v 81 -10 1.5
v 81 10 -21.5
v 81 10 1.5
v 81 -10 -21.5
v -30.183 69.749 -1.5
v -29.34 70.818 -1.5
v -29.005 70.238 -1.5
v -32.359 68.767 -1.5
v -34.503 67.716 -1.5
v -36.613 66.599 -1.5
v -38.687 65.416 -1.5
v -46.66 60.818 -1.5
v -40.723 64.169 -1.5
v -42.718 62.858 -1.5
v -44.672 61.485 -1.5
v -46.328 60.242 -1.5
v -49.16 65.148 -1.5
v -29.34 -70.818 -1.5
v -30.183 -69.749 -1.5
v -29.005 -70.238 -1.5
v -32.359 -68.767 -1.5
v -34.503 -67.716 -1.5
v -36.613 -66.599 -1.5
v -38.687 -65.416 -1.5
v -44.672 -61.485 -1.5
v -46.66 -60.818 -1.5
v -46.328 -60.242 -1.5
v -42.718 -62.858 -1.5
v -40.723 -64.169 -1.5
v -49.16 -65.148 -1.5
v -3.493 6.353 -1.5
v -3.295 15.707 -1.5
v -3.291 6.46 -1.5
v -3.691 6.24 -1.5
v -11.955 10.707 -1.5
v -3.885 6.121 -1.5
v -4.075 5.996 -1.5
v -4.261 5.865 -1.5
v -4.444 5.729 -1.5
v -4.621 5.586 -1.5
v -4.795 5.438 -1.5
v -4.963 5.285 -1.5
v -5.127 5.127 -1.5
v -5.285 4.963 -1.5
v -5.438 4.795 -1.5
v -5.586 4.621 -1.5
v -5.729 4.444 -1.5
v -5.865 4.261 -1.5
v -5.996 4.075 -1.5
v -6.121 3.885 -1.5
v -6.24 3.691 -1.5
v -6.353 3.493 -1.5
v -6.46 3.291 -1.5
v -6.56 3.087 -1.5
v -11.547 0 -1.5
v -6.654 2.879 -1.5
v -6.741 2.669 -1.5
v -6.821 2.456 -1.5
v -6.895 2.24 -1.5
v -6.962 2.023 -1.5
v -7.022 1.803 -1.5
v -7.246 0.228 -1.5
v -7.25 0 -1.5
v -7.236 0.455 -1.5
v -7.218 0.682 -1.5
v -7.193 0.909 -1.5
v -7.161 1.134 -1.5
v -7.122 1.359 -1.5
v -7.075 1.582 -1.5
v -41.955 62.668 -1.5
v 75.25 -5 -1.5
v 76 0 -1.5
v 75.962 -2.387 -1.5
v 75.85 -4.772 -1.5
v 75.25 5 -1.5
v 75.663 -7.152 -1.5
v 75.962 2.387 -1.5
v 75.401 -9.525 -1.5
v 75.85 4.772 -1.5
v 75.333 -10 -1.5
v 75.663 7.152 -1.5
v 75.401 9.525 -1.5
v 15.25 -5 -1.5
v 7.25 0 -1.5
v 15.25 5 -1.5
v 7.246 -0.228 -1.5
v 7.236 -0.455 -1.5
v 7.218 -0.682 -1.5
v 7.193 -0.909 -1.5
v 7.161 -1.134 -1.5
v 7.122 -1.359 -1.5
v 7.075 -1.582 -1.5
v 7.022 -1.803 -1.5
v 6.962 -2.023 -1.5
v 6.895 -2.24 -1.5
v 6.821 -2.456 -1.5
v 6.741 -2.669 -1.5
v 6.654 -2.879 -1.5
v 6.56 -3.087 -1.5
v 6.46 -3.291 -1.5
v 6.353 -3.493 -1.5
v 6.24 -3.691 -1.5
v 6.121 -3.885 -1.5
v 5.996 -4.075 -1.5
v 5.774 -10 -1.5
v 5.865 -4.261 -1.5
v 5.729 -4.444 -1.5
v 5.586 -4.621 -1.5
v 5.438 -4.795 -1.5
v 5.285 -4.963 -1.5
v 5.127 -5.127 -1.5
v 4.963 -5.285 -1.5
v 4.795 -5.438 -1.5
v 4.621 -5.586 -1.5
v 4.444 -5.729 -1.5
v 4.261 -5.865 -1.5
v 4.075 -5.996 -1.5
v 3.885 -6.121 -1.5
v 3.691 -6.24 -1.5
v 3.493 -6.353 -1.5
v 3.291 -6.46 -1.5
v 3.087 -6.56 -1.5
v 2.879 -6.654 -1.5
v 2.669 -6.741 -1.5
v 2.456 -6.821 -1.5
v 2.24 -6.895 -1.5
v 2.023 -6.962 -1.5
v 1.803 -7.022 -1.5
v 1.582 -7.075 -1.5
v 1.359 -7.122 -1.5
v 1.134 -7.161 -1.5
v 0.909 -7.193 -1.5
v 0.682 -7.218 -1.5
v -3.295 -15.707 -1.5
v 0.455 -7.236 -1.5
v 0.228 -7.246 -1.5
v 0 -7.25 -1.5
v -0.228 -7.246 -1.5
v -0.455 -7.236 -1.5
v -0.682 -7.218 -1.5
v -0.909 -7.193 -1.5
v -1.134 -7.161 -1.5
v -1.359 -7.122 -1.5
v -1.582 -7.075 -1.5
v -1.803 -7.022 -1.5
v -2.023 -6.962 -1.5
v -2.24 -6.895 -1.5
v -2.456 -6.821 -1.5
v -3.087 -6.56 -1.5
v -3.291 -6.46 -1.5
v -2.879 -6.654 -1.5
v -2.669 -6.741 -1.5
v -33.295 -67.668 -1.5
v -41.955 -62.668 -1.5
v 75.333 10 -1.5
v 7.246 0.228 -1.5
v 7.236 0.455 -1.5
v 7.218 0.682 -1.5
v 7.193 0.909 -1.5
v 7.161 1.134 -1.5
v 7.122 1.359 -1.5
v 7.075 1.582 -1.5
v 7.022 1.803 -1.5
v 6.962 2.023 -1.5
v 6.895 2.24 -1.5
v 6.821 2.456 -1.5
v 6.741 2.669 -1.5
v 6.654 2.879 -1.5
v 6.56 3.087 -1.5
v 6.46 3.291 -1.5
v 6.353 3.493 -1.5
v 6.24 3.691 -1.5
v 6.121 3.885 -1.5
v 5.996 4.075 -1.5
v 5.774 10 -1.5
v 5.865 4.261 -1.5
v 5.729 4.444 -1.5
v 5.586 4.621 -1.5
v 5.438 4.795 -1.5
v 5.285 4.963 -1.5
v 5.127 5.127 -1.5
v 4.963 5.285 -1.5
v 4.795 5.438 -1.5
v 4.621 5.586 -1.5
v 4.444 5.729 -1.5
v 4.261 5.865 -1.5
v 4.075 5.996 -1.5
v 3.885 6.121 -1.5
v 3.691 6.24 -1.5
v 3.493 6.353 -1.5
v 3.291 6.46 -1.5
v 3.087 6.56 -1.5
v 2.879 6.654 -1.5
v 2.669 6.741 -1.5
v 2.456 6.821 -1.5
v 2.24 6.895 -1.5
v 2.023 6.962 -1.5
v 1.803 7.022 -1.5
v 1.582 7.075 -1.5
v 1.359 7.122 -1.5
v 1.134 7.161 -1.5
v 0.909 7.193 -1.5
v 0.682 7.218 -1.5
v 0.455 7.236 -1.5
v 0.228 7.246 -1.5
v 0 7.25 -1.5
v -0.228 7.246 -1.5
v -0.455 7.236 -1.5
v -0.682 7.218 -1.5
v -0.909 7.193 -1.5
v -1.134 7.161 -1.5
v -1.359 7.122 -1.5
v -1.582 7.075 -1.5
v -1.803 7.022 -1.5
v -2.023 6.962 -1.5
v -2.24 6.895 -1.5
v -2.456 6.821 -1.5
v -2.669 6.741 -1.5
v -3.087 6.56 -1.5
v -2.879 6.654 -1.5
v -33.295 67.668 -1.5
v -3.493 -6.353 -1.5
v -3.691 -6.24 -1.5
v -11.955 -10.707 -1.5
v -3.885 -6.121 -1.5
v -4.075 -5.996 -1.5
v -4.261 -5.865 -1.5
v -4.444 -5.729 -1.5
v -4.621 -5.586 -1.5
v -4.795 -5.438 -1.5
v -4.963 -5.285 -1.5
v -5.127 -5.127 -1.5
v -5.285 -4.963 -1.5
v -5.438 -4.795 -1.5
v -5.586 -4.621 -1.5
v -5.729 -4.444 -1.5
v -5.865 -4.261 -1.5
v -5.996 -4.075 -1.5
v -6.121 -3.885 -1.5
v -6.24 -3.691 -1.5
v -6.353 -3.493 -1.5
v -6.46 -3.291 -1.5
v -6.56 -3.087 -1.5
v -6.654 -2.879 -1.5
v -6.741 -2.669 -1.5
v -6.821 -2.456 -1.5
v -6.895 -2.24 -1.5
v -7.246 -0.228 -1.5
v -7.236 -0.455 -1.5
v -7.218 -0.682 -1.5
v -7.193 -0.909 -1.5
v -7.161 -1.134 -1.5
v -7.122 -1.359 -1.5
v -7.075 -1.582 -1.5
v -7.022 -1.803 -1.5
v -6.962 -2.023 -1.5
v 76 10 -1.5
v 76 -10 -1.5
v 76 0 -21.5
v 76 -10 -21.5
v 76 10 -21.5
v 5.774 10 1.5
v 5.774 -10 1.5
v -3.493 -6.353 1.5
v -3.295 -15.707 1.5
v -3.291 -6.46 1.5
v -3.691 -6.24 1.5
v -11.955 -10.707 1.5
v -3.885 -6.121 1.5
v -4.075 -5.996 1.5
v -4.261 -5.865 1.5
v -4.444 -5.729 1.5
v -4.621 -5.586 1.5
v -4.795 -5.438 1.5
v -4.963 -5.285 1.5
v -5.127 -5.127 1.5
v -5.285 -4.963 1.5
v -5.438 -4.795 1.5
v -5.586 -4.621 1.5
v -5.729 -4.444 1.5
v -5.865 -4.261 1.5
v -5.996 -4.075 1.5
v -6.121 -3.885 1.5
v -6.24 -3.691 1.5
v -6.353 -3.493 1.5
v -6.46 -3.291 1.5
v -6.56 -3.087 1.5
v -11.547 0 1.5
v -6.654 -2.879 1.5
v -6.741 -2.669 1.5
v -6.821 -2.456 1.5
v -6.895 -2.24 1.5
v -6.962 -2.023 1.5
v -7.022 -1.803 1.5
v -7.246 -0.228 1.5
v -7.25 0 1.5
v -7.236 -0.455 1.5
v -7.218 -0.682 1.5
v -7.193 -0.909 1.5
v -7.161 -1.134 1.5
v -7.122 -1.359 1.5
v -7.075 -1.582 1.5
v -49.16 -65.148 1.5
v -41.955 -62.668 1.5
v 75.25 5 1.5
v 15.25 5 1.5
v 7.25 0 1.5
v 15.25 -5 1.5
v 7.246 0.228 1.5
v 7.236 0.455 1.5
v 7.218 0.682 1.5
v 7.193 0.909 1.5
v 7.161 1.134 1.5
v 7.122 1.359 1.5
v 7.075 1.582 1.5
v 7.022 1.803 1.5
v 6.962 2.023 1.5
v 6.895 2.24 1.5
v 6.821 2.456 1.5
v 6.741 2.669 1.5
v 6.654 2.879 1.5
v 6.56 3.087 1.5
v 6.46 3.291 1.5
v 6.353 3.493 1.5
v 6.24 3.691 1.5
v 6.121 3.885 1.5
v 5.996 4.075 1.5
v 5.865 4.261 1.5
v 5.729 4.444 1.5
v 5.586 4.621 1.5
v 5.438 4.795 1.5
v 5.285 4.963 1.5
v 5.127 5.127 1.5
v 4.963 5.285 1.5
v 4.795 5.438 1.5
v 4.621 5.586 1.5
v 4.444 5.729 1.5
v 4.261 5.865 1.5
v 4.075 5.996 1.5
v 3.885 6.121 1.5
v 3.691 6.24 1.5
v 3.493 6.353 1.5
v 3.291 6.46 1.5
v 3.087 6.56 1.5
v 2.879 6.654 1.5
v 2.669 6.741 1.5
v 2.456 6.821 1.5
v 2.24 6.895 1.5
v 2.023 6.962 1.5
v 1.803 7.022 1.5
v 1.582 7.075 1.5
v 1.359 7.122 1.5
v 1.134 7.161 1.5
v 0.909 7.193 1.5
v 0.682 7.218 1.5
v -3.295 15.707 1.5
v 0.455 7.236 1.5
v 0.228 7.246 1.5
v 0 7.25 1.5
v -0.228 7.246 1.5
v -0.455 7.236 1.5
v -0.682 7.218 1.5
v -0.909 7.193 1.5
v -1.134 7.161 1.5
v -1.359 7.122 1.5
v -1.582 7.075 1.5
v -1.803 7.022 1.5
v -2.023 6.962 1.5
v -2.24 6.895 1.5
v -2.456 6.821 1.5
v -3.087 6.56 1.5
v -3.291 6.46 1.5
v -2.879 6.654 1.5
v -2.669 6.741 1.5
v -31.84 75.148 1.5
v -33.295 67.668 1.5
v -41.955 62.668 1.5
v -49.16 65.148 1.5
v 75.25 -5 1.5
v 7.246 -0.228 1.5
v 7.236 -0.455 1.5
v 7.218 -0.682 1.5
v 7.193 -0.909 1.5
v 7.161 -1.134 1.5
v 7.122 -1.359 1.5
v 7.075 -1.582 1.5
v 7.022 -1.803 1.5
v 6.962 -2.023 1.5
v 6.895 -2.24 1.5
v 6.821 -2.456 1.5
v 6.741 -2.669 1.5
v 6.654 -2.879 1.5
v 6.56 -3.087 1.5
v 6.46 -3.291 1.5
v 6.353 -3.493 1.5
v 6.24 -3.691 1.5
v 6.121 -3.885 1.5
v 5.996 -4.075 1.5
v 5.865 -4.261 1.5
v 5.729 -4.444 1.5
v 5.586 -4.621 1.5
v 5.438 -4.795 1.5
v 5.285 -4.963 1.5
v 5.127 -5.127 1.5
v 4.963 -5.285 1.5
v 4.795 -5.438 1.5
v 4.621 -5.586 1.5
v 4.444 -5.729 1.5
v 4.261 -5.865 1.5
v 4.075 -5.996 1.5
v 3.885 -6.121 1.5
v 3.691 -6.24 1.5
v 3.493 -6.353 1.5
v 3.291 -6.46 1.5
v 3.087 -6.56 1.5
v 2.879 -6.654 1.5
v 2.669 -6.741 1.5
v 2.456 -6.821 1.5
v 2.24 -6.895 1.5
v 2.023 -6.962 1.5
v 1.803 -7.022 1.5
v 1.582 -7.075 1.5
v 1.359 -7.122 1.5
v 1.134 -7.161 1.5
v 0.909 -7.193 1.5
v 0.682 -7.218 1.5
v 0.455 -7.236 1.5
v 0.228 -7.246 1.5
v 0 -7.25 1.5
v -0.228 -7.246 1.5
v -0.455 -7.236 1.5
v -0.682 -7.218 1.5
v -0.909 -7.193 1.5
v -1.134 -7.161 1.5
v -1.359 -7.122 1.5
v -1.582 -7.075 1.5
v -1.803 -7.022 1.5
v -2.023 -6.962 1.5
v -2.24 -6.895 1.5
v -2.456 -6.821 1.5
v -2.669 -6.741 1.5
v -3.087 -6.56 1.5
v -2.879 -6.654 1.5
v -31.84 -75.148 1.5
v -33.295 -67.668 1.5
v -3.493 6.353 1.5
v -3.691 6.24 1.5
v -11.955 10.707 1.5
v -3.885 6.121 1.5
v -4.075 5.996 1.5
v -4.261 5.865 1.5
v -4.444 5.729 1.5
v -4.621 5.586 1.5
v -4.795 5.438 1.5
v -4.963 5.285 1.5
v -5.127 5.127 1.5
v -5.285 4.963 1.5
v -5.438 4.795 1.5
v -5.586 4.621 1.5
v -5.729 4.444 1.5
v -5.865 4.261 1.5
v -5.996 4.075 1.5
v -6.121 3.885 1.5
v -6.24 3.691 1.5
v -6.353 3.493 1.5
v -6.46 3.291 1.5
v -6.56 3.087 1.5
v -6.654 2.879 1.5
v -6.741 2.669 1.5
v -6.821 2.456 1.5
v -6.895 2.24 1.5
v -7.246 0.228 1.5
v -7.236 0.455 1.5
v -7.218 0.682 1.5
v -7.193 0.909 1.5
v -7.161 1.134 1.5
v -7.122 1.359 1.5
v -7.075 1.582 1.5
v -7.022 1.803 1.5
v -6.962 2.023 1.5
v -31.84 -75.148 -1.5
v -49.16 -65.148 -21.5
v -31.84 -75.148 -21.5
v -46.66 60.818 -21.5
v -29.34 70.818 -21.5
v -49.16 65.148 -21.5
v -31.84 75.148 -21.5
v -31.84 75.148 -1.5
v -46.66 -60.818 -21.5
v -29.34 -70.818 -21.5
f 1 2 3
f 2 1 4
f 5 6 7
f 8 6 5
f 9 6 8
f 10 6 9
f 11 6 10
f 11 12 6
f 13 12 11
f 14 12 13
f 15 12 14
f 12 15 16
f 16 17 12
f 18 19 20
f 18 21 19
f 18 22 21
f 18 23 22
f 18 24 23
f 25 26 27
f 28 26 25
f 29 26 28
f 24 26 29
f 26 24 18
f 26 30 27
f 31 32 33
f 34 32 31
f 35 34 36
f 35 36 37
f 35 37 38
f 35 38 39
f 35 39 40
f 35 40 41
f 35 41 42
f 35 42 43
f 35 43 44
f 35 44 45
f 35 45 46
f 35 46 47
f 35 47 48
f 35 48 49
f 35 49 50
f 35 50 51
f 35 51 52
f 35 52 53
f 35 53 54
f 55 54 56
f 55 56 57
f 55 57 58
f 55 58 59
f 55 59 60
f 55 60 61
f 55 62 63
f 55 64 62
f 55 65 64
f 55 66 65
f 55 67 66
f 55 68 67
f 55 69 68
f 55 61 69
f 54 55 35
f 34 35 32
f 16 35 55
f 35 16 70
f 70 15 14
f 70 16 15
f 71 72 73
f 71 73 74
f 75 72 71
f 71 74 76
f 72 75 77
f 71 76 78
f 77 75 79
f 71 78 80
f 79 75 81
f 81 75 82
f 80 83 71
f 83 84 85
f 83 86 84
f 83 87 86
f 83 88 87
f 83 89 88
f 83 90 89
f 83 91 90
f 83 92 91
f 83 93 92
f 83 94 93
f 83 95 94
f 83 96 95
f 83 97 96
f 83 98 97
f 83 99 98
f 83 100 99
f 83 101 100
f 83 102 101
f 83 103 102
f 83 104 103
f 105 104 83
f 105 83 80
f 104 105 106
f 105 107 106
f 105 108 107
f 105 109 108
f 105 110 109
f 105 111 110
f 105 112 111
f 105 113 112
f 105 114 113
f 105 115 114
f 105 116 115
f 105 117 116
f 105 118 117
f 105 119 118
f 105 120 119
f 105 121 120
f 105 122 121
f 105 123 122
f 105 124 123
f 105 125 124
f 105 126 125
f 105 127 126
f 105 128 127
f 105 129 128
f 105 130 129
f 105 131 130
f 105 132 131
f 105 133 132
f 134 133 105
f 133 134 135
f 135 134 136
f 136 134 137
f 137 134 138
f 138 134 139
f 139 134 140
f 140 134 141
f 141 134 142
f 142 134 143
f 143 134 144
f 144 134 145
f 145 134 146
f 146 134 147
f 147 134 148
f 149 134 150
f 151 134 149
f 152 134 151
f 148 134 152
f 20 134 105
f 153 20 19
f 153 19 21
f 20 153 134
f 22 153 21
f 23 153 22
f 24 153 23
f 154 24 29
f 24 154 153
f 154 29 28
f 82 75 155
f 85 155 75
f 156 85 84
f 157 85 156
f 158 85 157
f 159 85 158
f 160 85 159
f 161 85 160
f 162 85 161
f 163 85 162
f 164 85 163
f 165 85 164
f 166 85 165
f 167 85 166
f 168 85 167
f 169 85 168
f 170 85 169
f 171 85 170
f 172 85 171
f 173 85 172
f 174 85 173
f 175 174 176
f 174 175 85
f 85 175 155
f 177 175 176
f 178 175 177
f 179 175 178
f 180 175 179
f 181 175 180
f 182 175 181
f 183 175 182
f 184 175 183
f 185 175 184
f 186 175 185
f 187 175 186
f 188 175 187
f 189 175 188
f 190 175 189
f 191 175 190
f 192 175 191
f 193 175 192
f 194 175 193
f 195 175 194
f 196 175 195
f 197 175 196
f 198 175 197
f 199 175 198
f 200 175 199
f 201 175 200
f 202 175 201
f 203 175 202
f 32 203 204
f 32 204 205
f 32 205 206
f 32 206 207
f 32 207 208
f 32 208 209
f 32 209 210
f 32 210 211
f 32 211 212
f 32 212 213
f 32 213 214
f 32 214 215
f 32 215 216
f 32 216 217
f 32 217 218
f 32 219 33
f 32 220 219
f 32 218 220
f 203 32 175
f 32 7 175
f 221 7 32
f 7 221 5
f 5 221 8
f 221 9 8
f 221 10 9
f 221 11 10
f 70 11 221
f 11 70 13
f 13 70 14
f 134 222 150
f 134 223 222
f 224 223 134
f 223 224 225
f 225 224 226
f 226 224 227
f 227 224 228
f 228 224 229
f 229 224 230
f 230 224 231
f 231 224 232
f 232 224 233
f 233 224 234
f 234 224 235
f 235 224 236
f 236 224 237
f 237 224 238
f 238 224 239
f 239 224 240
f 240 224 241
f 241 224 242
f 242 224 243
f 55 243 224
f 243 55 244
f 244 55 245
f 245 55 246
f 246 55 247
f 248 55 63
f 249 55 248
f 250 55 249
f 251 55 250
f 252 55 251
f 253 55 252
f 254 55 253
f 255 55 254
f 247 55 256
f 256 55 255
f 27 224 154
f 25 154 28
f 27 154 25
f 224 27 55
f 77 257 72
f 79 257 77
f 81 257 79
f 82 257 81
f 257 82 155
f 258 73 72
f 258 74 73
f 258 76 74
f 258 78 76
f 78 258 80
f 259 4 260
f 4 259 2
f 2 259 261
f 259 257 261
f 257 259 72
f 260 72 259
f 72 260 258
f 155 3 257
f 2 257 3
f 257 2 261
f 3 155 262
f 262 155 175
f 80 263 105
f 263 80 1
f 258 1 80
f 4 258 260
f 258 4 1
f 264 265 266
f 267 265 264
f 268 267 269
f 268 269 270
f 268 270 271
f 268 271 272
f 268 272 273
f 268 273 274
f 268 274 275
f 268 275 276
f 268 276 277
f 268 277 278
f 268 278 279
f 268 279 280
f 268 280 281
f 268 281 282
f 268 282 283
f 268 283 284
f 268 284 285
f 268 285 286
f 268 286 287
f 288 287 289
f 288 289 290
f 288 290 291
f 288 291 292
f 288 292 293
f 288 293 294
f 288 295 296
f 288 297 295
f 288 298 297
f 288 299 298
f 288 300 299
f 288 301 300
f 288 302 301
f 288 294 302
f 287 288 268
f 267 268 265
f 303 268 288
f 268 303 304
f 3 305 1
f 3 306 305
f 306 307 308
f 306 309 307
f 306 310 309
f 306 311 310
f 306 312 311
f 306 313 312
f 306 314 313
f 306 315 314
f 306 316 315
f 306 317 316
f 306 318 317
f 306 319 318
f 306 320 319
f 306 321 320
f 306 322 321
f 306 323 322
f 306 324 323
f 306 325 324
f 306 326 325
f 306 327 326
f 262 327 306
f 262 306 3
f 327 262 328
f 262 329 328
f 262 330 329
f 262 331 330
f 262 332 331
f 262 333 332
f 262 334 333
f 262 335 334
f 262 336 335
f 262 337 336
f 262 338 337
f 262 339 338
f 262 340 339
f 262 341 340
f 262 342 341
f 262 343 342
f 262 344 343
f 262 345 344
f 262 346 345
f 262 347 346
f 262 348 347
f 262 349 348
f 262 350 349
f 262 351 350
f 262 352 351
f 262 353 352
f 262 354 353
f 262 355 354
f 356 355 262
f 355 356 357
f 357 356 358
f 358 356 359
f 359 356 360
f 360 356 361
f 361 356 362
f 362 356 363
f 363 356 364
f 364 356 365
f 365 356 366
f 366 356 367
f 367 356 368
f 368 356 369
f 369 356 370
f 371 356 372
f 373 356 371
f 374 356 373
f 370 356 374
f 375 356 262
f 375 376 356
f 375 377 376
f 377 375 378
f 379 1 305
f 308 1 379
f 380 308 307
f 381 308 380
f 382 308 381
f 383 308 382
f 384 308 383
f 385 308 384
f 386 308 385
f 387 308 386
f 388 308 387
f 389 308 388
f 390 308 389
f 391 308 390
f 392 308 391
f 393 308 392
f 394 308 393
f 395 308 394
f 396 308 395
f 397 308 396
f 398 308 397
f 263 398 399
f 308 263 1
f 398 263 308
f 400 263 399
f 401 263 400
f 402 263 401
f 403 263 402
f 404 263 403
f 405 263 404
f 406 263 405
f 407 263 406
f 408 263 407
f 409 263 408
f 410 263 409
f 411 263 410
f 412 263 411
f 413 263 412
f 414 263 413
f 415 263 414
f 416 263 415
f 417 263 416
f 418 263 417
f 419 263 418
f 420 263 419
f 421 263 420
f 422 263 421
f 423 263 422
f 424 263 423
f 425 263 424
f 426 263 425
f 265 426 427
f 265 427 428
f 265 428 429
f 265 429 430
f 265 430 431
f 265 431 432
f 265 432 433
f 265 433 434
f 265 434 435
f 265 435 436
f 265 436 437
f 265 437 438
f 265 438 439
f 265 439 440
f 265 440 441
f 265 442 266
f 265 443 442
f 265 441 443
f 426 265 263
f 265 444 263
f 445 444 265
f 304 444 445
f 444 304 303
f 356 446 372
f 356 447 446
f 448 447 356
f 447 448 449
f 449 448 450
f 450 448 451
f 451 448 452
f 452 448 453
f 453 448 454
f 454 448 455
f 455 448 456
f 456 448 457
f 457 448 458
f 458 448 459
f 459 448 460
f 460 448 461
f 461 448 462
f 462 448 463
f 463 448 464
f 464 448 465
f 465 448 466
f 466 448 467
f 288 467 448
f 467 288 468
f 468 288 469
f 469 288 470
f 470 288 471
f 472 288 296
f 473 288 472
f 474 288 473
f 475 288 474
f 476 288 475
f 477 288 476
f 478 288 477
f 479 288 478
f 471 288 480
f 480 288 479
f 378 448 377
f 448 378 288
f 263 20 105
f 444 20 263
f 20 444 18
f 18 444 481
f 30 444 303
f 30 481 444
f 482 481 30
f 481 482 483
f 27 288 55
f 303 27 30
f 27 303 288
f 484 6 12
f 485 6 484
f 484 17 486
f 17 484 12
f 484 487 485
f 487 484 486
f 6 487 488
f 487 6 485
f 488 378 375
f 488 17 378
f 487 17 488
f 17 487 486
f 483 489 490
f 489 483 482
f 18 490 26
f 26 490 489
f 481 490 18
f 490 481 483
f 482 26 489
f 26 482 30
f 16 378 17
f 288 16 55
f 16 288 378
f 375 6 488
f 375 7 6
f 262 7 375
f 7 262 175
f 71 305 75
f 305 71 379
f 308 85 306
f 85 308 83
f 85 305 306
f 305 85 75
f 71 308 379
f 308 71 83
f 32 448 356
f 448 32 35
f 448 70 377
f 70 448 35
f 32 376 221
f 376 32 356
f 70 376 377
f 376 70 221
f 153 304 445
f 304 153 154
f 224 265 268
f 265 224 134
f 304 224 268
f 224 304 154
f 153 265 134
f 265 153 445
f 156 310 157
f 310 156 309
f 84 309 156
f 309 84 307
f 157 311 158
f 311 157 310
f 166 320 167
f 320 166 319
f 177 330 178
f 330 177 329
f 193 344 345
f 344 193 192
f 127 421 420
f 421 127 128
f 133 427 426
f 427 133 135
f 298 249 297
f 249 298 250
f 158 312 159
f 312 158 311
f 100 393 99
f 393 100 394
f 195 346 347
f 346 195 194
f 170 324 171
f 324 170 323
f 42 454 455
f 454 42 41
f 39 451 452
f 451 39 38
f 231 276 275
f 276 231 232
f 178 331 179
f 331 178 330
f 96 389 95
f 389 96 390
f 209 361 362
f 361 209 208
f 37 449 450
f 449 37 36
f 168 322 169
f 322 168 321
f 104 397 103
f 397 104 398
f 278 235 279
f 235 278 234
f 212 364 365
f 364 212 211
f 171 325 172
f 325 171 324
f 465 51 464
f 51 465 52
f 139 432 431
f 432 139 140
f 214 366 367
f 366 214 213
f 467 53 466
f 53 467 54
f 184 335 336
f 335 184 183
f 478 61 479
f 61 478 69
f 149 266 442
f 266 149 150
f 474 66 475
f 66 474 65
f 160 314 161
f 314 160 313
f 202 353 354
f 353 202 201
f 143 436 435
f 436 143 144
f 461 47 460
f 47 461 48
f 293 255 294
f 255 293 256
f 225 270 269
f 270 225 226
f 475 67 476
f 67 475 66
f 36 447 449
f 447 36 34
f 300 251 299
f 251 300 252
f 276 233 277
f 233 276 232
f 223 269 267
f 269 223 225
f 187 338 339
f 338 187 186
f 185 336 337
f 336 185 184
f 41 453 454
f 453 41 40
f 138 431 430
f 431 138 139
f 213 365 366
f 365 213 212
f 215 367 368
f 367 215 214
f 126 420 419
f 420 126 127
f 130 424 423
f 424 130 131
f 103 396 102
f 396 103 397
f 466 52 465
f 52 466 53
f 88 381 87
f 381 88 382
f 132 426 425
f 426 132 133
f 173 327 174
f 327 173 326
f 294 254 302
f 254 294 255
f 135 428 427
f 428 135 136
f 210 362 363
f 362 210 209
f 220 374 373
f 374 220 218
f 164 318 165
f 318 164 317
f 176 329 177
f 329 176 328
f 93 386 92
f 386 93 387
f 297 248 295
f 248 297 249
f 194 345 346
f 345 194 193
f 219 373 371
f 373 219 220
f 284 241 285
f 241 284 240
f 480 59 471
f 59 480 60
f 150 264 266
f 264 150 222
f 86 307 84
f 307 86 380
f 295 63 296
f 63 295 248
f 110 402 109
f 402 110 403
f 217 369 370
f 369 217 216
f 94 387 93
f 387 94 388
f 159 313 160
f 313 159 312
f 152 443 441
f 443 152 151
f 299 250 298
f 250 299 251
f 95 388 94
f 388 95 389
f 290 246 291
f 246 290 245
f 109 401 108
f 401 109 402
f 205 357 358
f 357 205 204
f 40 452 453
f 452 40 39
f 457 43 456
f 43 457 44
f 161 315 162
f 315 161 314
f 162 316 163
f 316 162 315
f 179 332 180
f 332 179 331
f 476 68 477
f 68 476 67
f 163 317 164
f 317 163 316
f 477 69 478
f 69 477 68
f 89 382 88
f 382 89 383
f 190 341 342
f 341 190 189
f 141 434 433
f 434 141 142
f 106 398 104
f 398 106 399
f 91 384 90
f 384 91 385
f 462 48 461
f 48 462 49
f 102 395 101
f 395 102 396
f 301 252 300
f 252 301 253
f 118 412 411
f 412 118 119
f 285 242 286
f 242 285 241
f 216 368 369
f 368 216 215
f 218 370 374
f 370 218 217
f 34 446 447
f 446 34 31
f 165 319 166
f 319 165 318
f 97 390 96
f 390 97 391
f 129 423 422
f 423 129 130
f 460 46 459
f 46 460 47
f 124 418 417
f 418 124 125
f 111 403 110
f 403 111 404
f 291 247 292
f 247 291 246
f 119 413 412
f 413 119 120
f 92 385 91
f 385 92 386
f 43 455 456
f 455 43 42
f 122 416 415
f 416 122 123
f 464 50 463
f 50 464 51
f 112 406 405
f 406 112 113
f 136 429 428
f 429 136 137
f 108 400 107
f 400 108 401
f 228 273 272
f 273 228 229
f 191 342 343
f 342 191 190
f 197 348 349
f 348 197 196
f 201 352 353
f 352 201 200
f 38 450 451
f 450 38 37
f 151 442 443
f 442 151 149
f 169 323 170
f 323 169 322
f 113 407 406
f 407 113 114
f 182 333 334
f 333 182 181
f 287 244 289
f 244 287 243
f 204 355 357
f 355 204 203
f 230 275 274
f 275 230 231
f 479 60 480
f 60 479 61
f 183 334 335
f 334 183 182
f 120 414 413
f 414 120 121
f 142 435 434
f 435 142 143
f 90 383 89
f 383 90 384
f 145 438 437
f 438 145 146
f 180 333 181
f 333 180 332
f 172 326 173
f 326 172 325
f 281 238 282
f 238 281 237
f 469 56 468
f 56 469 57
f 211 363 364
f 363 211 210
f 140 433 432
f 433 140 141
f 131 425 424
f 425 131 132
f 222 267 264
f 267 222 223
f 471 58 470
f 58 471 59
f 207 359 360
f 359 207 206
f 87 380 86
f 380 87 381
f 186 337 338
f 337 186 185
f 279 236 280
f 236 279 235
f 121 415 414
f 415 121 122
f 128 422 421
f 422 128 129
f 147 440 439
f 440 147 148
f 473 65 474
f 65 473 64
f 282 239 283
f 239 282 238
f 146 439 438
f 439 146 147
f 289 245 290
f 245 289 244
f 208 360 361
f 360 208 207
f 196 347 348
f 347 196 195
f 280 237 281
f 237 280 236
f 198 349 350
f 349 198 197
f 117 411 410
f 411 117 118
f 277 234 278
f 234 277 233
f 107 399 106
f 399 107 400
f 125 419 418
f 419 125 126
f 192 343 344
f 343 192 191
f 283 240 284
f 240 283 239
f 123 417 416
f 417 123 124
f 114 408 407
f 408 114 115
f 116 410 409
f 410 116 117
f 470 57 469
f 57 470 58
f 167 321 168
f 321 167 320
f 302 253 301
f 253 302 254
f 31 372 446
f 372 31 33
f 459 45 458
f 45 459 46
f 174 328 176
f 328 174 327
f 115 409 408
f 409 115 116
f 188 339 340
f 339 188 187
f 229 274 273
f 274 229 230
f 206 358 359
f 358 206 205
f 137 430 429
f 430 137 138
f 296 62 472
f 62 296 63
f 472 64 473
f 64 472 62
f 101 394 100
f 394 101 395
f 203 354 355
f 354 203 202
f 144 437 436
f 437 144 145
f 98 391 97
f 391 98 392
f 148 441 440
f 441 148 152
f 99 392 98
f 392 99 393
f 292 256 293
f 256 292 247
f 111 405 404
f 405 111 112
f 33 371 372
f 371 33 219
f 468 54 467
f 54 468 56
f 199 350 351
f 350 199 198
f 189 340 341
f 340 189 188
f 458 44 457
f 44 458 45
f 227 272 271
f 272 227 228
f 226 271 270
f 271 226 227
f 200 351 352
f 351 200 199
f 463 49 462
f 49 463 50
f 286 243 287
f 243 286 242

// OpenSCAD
placer=0; //1 = Generate a Placement tool, so you can use it to place the center dot through the locator tool. 0 = Don't generate. 
locator=1; // 1 = Generate a Locator tool, which is the main tool, 0= Don't generate

arms=3; //Accepts 3 or 4, if you wanted to use more, you'd need to modify the code. Especially the 150*(4-arms)

mirror_diameter=152;
arm_height=3;
arm_width=20;
arm_cutout=60; //along half of each arm
support_height=20;
support_thickness=5;
center_dot_diameter=14; 

center_dot_hole_diameter=center_dot_diameter+0.5; //If using placer, you might add 0.1 - 0.5mm 
center_dot_inner_diameter=4;
close_distance=0; //0 for flat supports touching the mirror, 1 or more for a round support.

placer_length=30;
placer_diameter=center_dot_diameter;

$fn=200;


module locator() {
difference(){
union(){
	//cube([mirror_diameter+support_thickness*2, arm_width, arm_height], center=true);
	
	for (i = [0:arms-1]) {
		rotate([0,0,(360/arms)*i]) {
	translate([mirror_diameter/2-close_distance,-arm_width/2,-arm_height/2-support_height])
		cube([support_thickness+close_distance, arm_width, support_height]);
		}
		rotate([0,0,(360/arms)*i+150*(4-arms)]){ 
			
			translate([0,(mirror_diameter+support_thickness*2)/4,0])
		cube([arm_width, (mirror_diameter+support_thickness*2)/2,  arm_height], center=true);
		}
	}
	
} //union
	translate([0,0,-arm_height/2-support_height])
	cylinder(h=support_height, r=mirror_diameter/2);
	cylinder(h=arm_height*2,r=center_dot_hole_diameter/2, center=true);
    if (arm_cutout > 0) {
	for (i = [0:arms-1]) {
		rotate([0,0,(360/arms)*i]) 
	translate([mirror_diameter/4+center_dot_hole_diameter/2,0,0])
		cube([arm_cutout, arm_width/2, arm_height*2], center=true);
	}
}
}
}


module placer() {
		cylinder(h=placer_length,r=center_dot_diameter/2, center=true);
	
	
}

if (locator == 1 )
locator();
if (placer == 1)
placer();
